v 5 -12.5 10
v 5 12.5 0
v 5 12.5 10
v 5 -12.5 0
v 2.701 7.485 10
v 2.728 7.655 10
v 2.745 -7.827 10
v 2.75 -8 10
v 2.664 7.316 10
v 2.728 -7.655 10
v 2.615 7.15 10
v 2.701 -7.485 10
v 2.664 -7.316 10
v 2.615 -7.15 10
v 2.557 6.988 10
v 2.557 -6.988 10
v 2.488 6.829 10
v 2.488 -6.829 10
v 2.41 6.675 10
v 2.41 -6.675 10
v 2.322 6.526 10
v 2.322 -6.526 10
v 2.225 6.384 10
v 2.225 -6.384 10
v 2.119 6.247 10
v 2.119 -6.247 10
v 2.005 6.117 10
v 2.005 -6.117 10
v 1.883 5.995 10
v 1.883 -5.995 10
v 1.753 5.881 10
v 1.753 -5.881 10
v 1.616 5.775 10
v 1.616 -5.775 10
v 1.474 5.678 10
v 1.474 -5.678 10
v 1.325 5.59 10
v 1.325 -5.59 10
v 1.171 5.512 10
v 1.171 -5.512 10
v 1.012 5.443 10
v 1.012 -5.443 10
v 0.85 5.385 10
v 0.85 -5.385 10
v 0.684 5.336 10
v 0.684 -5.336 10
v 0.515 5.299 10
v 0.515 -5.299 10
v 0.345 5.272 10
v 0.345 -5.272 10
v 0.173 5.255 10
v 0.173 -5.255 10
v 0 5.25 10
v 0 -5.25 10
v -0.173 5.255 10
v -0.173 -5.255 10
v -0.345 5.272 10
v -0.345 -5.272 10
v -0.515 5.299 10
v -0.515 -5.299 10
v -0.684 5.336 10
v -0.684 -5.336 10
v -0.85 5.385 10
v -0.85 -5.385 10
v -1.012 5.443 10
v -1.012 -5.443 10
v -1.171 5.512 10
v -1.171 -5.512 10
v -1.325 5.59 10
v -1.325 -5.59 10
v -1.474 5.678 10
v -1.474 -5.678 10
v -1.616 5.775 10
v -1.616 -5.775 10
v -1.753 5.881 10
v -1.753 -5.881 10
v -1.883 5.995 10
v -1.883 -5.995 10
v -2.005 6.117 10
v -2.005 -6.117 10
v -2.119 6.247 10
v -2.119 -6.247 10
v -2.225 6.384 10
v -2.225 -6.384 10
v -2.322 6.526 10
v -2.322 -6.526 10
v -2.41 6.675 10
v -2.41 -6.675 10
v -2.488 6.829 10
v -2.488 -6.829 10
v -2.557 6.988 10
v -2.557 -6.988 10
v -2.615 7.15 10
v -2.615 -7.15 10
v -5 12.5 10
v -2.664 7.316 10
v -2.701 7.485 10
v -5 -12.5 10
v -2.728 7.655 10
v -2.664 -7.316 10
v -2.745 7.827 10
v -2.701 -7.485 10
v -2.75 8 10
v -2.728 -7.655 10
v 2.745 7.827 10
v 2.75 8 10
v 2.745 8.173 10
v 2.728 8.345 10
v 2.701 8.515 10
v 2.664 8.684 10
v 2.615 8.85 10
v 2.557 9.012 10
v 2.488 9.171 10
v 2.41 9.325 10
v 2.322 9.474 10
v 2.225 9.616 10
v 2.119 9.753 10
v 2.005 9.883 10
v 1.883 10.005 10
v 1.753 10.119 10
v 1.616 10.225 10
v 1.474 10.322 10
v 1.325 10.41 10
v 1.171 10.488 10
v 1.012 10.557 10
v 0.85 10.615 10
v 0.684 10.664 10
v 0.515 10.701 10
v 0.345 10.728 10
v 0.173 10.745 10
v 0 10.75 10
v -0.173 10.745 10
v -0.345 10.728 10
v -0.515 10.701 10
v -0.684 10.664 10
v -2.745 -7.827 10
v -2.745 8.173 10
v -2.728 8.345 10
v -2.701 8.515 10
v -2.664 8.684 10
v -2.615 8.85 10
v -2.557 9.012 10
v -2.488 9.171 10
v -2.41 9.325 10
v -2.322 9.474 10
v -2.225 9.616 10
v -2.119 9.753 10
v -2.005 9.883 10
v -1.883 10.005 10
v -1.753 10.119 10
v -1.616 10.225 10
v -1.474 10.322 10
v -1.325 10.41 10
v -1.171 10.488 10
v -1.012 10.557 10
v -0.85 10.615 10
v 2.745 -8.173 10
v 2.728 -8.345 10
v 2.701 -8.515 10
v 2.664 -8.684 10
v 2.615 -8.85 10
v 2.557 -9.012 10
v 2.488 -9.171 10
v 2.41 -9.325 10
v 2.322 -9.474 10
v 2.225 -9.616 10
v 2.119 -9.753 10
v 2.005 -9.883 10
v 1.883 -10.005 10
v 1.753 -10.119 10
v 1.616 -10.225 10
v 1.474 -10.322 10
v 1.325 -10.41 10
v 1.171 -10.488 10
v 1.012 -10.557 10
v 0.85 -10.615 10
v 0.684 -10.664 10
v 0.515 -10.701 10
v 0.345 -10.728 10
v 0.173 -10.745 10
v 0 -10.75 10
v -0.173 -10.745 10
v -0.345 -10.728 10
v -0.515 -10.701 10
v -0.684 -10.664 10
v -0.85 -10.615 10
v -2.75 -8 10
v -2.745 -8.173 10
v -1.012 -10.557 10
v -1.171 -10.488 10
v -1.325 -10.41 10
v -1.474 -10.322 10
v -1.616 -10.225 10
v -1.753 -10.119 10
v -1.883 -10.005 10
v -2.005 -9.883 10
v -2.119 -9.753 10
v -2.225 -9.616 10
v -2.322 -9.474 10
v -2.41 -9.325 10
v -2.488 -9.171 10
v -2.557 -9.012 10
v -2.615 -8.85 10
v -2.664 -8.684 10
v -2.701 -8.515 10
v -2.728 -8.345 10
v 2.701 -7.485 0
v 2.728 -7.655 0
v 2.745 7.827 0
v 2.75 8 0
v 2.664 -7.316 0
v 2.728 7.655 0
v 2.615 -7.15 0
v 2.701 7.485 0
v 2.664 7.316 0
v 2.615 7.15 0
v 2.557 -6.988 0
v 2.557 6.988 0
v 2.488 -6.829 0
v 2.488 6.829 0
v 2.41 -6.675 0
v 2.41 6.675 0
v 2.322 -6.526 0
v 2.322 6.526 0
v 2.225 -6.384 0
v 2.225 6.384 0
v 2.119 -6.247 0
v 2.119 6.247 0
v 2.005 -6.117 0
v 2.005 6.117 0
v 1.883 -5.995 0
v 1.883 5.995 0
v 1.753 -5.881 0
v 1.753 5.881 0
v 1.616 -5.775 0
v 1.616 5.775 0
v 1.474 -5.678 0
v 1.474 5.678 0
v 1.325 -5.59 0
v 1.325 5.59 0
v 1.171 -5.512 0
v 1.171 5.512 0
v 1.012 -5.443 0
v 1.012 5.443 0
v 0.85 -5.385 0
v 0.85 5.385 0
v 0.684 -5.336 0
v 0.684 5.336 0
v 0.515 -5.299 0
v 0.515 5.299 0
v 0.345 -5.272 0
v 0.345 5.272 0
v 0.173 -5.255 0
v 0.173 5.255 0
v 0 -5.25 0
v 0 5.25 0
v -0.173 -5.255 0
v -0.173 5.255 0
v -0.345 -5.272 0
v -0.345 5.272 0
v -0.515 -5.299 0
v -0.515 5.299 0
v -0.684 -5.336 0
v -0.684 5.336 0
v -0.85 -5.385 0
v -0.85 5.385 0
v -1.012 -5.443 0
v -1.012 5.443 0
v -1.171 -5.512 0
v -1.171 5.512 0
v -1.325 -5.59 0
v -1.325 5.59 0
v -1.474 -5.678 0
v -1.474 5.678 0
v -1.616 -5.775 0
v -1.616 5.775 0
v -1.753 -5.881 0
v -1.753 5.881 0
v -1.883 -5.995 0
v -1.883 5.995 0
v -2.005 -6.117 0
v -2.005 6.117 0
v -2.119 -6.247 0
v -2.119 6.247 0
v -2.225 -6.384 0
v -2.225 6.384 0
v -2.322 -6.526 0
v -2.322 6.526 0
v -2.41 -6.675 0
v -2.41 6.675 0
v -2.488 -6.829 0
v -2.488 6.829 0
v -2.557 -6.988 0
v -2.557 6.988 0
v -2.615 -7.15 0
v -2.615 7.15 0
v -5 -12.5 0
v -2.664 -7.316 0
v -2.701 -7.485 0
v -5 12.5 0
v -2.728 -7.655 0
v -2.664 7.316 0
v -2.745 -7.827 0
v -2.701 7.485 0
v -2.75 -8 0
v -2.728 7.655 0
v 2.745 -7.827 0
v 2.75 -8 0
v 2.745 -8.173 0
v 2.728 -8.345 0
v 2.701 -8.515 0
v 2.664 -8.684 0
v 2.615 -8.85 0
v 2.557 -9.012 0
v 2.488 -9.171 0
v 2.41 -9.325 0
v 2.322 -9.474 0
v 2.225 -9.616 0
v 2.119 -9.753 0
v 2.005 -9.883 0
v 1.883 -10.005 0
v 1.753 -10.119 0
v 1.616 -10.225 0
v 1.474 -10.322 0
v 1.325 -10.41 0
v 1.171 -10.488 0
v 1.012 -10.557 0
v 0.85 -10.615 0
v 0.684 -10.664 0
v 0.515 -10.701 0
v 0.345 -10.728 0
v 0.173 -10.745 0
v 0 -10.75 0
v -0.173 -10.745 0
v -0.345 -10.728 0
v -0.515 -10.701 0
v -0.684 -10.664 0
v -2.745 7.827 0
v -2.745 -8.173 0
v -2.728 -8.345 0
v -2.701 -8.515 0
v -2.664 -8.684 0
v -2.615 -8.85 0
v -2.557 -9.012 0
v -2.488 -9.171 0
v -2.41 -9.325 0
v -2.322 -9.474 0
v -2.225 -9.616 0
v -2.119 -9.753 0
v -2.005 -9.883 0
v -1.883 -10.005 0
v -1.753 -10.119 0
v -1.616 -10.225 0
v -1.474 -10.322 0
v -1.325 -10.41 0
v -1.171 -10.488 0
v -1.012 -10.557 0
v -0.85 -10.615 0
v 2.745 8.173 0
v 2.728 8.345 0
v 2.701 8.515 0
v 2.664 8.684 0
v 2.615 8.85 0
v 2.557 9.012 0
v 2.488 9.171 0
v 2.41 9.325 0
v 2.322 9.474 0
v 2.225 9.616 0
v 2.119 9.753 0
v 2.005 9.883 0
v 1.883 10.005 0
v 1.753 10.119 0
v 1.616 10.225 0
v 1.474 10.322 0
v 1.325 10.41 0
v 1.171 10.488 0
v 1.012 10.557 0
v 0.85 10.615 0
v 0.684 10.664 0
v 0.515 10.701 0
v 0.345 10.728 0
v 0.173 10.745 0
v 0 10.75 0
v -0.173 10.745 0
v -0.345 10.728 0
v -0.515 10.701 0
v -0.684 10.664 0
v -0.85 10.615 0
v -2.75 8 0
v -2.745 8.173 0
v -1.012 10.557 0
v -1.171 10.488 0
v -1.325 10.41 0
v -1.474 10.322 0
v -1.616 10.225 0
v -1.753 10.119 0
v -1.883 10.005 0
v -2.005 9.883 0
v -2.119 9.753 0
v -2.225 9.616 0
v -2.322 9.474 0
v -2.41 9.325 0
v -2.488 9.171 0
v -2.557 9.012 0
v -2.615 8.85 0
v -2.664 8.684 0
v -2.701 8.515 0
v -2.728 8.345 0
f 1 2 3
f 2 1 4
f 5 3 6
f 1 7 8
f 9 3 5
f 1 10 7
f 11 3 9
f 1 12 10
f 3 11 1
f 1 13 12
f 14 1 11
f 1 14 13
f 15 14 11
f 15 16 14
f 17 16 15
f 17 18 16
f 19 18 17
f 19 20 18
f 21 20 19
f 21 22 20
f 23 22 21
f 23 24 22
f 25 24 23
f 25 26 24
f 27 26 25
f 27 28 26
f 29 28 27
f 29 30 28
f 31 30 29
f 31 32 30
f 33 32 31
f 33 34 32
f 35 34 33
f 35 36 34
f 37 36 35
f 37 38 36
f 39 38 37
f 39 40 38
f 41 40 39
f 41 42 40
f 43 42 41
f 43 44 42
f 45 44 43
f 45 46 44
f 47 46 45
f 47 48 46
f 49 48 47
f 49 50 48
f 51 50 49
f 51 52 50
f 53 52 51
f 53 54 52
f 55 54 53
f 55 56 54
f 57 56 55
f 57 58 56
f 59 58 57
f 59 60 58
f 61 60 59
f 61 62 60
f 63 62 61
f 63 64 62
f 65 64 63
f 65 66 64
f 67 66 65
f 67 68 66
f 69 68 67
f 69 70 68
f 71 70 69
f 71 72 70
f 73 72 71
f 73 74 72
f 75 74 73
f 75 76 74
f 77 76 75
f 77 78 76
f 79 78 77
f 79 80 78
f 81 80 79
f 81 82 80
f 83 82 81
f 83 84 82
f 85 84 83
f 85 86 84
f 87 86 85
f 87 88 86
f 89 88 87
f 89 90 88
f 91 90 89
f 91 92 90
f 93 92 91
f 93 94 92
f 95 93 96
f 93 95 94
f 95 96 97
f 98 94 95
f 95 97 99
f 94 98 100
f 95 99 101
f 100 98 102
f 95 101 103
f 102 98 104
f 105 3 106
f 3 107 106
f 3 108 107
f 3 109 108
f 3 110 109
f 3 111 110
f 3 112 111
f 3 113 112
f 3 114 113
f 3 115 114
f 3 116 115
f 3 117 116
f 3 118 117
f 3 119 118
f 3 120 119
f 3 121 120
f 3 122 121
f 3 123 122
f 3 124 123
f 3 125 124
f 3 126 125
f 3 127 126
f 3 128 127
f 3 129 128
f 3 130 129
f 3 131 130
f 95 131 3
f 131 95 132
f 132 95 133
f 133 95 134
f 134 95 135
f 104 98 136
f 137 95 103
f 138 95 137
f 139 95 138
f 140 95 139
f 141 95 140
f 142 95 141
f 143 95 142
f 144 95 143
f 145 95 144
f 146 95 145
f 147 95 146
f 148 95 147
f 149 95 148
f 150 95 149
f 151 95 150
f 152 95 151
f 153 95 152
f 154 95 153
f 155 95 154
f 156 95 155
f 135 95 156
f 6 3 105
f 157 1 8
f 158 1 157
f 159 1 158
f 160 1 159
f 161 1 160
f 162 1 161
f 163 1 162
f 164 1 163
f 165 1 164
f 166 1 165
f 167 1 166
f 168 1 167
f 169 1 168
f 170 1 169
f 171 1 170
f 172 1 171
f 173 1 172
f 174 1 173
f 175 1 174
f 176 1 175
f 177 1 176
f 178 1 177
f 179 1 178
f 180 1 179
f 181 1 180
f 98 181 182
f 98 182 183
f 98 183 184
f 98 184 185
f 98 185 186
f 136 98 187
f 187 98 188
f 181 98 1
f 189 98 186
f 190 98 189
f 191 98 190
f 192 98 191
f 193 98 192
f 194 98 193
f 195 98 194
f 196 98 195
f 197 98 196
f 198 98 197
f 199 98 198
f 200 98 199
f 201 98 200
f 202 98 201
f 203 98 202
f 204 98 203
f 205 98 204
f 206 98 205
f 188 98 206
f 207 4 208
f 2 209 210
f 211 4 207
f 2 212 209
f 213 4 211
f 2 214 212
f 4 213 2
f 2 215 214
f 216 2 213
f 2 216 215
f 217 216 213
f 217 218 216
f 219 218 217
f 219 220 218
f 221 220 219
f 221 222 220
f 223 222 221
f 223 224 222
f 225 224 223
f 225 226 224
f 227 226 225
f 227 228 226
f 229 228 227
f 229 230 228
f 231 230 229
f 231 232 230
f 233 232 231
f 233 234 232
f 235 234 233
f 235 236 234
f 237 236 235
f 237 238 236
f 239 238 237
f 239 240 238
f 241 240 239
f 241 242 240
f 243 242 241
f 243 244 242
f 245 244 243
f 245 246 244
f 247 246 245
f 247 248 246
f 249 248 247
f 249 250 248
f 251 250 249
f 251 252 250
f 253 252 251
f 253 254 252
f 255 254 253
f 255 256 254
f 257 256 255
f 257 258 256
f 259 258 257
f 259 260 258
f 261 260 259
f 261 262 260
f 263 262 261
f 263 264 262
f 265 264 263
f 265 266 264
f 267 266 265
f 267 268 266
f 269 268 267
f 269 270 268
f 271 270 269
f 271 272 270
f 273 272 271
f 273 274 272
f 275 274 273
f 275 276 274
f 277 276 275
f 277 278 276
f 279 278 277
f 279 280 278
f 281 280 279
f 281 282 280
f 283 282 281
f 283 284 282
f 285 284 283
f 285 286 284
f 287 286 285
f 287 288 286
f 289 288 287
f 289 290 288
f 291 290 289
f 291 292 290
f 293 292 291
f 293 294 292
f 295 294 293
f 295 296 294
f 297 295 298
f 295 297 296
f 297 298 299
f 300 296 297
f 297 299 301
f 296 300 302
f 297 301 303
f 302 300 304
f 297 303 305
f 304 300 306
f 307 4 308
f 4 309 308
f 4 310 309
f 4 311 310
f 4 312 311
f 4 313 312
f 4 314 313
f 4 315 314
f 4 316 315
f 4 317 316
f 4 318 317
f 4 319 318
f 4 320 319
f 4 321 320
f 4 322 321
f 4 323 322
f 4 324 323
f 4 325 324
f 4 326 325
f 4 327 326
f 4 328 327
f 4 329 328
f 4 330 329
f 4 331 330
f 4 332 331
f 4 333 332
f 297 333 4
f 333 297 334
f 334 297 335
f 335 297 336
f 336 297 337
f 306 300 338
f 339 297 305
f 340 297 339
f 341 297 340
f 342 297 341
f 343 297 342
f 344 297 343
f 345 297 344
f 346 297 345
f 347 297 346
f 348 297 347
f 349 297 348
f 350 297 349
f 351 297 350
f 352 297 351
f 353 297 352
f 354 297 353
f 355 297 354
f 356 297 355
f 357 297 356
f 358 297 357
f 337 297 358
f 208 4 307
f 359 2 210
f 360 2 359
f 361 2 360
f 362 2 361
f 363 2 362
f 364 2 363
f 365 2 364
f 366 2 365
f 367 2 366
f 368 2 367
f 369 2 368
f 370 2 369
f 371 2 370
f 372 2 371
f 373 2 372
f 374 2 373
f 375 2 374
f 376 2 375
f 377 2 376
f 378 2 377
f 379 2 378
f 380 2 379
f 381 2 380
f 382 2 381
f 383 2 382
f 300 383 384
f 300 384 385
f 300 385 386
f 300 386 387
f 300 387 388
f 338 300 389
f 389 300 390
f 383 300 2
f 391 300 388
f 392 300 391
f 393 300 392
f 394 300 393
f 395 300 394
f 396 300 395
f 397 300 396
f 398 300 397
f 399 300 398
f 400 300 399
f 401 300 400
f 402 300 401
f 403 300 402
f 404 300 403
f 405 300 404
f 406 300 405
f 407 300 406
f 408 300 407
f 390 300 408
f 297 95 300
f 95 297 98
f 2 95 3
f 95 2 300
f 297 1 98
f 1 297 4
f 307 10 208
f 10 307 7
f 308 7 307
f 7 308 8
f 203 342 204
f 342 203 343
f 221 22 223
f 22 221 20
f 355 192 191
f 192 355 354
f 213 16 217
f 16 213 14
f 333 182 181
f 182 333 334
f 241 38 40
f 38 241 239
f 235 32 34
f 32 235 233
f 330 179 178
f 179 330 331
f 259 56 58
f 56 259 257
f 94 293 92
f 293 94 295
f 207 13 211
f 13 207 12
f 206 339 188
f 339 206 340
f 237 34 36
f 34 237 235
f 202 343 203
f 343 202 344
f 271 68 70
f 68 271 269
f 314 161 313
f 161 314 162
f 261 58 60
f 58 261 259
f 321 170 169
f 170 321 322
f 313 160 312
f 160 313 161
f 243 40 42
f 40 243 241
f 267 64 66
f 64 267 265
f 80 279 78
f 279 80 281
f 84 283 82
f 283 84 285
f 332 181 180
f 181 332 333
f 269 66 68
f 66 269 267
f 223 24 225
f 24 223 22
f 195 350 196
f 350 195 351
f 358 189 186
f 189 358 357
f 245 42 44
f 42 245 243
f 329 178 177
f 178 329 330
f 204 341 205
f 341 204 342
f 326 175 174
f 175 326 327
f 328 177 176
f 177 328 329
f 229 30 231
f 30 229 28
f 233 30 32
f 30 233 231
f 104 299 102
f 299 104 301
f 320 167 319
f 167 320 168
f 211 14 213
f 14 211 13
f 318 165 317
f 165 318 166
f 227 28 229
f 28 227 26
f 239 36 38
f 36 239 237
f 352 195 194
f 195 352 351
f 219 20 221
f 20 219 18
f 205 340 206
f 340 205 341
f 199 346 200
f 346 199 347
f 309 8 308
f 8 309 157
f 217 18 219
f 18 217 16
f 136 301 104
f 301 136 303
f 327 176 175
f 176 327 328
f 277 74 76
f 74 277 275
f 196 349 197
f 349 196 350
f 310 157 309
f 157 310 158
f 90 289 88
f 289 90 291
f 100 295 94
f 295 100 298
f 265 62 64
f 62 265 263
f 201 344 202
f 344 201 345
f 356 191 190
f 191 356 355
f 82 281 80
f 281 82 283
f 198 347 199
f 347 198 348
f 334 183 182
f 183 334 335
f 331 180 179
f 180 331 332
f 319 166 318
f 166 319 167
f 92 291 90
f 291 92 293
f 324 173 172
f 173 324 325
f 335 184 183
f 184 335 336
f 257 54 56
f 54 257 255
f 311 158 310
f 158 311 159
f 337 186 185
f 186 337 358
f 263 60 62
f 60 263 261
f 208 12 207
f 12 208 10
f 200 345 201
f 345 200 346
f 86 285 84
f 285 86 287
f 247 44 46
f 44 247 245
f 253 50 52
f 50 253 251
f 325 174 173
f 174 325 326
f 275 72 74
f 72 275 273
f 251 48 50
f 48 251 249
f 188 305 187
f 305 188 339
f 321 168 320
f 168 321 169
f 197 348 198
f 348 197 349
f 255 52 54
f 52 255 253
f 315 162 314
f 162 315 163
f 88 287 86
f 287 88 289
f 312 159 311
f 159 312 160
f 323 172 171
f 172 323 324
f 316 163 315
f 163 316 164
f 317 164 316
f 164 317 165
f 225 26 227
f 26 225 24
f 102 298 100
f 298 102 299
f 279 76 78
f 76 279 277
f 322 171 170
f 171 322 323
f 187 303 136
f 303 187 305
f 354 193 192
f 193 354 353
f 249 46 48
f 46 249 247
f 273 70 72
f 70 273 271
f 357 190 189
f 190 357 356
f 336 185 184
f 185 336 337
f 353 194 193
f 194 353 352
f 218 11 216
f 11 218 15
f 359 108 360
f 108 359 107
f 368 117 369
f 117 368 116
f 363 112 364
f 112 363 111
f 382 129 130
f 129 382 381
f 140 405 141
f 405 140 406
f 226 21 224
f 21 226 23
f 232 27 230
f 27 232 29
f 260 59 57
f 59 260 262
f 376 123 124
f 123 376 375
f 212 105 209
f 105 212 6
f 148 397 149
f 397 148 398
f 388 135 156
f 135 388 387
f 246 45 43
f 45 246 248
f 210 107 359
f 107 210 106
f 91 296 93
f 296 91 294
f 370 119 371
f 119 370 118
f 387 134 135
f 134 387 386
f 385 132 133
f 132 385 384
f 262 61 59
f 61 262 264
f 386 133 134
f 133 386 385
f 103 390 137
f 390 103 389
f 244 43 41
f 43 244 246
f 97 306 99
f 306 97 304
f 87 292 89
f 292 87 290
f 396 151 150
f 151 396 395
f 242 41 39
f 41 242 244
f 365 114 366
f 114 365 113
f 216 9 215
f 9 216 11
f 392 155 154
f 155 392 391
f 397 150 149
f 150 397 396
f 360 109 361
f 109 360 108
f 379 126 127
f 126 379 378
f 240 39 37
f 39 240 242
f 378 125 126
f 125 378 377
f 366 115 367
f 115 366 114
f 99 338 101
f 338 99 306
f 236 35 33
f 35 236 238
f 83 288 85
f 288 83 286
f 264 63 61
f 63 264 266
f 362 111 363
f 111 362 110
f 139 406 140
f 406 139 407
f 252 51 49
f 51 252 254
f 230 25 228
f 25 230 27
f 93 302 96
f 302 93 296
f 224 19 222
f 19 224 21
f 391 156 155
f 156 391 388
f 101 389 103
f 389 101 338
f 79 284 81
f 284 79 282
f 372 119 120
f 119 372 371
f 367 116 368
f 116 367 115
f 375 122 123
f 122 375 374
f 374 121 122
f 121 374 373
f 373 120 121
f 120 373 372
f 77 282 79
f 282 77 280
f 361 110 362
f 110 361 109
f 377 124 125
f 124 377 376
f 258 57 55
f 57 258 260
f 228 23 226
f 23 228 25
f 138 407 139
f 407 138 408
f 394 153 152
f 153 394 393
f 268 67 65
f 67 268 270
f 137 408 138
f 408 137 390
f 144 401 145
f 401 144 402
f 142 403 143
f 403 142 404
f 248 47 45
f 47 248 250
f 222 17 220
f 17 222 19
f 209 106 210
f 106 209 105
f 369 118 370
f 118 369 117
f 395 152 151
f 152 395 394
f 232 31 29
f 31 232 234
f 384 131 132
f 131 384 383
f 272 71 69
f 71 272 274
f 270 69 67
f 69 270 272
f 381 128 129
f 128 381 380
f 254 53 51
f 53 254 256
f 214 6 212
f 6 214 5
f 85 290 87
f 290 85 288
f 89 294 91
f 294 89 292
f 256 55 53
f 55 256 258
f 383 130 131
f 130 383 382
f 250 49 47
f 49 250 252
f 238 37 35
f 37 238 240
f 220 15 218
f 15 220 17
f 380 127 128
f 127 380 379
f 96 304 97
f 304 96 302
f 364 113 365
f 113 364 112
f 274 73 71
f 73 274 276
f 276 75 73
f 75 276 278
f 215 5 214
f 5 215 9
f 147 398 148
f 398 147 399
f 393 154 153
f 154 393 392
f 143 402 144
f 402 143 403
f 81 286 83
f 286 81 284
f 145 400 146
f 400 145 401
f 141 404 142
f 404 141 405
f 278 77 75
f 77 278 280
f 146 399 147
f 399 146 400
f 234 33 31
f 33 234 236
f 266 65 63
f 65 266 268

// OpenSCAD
WIDTH = 10;
LENGTH = 25;
THICKNESS = 10;

HOLE_DIA = 5.5; //4.5;
HOLE_SPACING = 16;

$fn = 100;

difference() {
  translate([-WIDTH/2, -LENGTH/2, 0])
  cube(size = [WIDTH, LENGTH, THICKNESS]);

  translate([0, -HOLE_SPACING/2, 0])
  cylinder(d = HOLE_DIA, h = THICKNESS);

  translate([0, HOLE_SPACING/2, 0])
  cylinder(d = HOLE_DIA, h = THICKNESS);
}
